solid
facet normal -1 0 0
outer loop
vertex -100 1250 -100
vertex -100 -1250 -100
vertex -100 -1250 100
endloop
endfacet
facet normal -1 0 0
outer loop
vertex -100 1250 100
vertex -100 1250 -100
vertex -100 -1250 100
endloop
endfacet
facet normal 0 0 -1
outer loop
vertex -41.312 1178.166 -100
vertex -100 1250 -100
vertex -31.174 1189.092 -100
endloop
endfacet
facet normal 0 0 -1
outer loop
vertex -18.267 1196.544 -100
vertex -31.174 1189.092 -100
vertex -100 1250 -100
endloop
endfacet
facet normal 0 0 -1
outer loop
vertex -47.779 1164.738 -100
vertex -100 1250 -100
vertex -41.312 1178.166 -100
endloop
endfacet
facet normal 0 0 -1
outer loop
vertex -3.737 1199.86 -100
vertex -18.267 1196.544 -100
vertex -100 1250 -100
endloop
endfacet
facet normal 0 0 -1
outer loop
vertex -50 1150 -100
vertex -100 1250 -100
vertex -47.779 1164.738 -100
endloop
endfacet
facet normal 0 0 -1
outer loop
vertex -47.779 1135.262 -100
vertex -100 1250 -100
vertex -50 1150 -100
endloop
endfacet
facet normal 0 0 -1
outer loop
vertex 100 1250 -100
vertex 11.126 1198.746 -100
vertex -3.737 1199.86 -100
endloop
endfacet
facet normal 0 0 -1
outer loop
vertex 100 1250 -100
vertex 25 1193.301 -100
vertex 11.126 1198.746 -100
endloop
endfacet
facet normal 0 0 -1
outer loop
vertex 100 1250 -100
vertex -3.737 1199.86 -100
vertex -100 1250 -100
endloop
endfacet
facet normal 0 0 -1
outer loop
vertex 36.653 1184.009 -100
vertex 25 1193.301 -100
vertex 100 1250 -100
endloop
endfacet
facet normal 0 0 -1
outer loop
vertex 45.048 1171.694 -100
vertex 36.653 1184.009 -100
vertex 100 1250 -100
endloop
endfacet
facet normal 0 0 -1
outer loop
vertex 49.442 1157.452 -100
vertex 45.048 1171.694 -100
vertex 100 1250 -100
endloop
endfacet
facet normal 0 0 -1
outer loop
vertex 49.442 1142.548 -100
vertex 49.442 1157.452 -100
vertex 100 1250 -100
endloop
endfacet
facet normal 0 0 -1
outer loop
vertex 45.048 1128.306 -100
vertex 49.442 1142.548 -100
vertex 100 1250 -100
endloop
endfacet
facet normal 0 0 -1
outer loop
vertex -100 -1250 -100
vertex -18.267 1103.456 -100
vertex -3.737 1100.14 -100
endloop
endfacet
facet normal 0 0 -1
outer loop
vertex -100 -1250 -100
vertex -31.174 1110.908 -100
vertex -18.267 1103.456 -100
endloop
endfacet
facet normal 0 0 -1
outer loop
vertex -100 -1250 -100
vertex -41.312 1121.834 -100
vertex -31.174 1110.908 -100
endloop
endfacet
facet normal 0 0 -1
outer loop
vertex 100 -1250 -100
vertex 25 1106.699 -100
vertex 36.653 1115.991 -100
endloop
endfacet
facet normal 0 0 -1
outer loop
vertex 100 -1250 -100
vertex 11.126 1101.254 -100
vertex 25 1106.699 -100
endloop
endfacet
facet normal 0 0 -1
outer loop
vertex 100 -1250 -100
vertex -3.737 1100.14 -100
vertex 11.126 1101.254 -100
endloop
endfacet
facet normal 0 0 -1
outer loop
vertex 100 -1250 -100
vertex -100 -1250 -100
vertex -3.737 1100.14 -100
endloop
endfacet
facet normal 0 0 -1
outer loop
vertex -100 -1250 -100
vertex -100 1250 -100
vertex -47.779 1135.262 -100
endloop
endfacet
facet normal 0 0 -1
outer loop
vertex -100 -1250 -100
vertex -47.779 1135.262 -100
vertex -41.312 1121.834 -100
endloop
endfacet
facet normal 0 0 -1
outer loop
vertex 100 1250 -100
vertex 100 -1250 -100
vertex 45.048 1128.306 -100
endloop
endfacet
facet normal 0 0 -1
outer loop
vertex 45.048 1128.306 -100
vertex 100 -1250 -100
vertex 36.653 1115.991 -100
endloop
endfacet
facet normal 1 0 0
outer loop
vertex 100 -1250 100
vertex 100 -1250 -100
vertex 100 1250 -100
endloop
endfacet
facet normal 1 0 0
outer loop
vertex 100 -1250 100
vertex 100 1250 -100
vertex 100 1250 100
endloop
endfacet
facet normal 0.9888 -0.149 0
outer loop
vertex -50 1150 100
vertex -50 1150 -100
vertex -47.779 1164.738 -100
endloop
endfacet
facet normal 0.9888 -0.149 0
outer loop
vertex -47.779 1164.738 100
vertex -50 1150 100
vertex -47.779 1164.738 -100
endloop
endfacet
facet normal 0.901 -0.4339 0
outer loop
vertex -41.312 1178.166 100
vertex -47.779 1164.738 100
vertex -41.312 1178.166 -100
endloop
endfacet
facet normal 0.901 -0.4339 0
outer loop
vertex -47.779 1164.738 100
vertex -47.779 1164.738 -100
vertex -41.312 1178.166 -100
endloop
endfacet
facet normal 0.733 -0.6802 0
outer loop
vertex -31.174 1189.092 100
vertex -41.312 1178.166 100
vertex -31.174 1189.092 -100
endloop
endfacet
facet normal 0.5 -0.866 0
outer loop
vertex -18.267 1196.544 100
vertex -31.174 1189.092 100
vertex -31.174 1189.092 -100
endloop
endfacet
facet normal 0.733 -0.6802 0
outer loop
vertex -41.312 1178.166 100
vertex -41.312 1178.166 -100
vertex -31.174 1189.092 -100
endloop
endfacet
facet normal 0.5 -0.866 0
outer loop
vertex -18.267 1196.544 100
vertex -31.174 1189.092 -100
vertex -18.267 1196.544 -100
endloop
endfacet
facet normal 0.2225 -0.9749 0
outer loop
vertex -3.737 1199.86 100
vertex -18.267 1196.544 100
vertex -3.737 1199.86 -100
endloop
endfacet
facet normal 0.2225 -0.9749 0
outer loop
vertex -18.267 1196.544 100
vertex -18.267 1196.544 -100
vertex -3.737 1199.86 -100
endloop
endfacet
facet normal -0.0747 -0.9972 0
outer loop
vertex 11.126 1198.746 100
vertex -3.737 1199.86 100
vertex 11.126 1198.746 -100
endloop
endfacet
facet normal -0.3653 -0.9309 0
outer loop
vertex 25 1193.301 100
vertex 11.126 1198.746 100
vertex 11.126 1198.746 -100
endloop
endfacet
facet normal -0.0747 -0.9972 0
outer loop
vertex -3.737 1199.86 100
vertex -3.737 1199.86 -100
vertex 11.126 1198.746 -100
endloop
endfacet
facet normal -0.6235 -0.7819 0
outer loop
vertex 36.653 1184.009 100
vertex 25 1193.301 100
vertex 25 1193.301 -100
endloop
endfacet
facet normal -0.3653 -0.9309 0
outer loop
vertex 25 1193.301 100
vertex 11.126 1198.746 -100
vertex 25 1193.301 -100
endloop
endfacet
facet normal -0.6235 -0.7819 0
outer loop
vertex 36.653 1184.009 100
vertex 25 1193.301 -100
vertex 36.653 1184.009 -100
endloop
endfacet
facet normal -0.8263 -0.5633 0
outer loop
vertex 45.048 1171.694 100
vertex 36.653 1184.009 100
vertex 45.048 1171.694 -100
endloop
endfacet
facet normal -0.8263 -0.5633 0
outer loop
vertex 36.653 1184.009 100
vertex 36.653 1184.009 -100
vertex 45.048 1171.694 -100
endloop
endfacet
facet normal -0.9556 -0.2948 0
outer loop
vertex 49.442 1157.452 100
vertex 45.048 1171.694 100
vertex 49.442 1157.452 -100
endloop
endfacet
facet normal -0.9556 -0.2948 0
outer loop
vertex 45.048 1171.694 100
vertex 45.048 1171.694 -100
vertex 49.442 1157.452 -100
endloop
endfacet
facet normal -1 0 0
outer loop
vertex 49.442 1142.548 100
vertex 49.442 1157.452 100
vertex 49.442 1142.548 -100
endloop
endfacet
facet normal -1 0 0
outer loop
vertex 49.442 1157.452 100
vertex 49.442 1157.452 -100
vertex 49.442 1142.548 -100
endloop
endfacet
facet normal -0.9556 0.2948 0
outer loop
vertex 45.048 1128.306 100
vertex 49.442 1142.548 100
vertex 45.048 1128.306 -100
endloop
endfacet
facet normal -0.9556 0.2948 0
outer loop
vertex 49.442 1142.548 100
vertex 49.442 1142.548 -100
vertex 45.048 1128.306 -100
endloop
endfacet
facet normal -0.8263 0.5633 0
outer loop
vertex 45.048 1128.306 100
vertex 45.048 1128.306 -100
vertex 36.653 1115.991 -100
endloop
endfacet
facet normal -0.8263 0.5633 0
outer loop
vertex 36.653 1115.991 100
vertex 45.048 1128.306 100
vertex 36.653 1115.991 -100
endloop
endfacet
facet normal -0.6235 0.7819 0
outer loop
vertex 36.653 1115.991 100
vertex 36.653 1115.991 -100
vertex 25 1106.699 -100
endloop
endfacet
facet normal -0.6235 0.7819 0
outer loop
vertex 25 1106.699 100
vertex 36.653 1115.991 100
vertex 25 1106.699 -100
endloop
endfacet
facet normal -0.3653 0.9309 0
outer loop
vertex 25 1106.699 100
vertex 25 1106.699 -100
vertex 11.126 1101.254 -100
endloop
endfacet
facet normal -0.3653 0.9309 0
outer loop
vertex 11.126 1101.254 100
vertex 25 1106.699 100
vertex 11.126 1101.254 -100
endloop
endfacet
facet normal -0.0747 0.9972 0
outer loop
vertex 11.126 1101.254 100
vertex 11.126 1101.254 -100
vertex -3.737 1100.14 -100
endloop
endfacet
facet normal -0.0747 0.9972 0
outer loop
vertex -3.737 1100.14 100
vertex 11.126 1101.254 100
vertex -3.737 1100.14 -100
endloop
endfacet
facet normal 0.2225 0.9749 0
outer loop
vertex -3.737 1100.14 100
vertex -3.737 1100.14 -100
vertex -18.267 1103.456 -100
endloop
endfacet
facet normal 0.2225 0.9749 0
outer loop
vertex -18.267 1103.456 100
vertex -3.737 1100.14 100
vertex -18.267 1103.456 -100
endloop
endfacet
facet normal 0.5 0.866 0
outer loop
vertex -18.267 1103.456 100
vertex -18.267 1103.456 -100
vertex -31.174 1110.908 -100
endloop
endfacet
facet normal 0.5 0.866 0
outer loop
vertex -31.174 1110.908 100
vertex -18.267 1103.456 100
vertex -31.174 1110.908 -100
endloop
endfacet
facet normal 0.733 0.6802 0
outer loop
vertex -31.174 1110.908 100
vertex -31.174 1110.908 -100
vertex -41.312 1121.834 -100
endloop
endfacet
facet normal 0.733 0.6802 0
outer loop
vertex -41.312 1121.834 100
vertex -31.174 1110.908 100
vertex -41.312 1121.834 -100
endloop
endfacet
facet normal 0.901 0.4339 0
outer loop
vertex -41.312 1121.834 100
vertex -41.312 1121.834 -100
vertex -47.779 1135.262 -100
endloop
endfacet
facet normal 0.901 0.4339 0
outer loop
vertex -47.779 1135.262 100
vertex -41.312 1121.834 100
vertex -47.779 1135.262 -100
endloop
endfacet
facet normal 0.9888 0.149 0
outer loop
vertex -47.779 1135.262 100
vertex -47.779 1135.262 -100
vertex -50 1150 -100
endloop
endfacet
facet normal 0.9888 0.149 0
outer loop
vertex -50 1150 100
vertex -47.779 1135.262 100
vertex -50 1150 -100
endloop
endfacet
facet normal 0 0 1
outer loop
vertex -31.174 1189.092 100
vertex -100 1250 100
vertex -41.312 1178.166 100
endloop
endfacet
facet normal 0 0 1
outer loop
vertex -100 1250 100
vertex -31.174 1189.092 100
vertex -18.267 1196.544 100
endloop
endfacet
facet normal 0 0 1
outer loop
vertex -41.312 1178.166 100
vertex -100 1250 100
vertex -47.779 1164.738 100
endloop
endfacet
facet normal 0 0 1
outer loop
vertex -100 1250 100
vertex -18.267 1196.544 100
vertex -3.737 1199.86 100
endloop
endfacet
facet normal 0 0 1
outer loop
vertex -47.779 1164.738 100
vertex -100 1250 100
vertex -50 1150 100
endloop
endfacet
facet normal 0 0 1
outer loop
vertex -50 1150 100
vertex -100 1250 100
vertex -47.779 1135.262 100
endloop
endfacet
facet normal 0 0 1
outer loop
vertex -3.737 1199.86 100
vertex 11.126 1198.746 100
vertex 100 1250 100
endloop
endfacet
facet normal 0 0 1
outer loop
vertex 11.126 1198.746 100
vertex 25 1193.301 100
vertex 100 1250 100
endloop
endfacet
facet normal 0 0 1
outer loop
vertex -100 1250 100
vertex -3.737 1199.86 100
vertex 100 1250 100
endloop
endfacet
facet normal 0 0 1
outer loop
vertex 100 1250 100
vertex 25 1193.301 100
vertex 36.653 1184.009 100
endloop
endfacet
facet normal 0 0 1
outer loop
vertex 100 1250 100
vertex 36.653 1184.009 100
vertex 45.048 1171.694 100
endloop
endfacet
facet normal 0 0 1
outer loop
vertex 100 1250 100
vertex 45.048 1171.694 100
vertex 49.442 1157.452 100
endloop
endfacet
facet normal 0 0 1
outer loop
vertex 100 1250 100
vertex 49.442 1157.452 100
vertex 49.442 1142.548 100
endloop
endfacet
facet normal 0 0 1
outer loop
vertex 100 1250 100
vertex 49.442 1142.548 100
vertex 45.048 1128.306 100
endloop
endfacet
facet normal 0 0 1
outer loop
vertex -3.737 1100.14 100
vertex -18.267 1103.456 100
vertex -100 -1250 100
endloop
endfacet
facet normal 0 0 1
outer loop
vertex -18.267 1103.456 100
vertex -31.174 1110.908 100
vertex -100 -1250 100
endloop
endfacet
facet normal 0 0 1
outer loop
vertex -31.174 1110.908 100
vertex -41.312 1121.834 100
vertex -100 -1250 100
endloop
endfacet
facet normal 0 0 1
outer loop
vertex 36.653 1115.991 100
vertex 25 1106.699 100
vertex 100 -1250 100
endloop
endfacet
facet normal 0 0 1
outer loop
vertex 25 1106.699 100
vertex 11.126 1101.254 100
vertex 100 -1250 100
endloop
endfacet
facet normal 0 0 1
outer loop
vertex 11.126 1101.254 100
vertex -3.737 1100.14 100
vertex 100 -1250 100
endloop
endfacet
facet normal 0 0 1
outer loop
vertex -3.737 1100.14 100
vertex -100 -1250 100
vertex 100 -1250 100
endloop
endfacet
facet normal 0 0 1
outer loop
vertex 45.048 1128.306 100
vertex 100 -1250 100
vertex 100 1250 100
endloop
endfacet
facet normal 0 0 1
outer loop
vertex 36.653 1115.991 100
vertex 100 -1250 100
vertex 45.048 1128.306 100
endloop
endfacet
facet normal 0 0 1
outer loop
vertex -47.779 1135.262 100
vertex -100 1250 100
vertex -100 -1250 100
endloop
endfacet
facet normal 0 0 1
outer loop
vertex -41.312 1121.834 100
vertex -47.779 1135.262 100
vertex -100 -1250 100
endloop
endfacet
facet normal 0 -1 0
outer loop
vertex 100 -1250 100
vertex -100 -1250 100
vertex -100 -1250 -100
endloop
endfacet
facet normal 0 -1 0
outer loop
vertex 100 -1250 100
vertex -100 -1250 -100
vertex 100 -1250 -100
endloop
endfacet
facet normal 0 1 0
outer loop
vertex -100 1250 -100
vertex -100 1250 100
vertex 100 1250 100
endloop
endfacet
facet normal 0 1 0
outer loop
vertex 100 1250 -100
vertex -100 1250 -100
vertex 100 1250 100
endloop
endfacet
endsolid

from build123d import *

# Parameters (mm, degrees)
F0_W     = 200
F0_H     = 200
F1_DEPTH = 1250
F3_D     = 100
F3_DEPTH = 200


with BuildPart() as f1:
    # F0 (on Front) → F1 (new body, symmetric)
    with BuildSketch(Plane.XZ):
        Rectangle(F0_W, F0_H)
    extrude(amount=F1_DEPTH, both=True)

    # F3
    with Locations(Plane.XY.offset(100)):
        with Locations((0, 1150)):
            Hole(F3_D / 2, depth=F3_DEPTH)


solid = f1.part
